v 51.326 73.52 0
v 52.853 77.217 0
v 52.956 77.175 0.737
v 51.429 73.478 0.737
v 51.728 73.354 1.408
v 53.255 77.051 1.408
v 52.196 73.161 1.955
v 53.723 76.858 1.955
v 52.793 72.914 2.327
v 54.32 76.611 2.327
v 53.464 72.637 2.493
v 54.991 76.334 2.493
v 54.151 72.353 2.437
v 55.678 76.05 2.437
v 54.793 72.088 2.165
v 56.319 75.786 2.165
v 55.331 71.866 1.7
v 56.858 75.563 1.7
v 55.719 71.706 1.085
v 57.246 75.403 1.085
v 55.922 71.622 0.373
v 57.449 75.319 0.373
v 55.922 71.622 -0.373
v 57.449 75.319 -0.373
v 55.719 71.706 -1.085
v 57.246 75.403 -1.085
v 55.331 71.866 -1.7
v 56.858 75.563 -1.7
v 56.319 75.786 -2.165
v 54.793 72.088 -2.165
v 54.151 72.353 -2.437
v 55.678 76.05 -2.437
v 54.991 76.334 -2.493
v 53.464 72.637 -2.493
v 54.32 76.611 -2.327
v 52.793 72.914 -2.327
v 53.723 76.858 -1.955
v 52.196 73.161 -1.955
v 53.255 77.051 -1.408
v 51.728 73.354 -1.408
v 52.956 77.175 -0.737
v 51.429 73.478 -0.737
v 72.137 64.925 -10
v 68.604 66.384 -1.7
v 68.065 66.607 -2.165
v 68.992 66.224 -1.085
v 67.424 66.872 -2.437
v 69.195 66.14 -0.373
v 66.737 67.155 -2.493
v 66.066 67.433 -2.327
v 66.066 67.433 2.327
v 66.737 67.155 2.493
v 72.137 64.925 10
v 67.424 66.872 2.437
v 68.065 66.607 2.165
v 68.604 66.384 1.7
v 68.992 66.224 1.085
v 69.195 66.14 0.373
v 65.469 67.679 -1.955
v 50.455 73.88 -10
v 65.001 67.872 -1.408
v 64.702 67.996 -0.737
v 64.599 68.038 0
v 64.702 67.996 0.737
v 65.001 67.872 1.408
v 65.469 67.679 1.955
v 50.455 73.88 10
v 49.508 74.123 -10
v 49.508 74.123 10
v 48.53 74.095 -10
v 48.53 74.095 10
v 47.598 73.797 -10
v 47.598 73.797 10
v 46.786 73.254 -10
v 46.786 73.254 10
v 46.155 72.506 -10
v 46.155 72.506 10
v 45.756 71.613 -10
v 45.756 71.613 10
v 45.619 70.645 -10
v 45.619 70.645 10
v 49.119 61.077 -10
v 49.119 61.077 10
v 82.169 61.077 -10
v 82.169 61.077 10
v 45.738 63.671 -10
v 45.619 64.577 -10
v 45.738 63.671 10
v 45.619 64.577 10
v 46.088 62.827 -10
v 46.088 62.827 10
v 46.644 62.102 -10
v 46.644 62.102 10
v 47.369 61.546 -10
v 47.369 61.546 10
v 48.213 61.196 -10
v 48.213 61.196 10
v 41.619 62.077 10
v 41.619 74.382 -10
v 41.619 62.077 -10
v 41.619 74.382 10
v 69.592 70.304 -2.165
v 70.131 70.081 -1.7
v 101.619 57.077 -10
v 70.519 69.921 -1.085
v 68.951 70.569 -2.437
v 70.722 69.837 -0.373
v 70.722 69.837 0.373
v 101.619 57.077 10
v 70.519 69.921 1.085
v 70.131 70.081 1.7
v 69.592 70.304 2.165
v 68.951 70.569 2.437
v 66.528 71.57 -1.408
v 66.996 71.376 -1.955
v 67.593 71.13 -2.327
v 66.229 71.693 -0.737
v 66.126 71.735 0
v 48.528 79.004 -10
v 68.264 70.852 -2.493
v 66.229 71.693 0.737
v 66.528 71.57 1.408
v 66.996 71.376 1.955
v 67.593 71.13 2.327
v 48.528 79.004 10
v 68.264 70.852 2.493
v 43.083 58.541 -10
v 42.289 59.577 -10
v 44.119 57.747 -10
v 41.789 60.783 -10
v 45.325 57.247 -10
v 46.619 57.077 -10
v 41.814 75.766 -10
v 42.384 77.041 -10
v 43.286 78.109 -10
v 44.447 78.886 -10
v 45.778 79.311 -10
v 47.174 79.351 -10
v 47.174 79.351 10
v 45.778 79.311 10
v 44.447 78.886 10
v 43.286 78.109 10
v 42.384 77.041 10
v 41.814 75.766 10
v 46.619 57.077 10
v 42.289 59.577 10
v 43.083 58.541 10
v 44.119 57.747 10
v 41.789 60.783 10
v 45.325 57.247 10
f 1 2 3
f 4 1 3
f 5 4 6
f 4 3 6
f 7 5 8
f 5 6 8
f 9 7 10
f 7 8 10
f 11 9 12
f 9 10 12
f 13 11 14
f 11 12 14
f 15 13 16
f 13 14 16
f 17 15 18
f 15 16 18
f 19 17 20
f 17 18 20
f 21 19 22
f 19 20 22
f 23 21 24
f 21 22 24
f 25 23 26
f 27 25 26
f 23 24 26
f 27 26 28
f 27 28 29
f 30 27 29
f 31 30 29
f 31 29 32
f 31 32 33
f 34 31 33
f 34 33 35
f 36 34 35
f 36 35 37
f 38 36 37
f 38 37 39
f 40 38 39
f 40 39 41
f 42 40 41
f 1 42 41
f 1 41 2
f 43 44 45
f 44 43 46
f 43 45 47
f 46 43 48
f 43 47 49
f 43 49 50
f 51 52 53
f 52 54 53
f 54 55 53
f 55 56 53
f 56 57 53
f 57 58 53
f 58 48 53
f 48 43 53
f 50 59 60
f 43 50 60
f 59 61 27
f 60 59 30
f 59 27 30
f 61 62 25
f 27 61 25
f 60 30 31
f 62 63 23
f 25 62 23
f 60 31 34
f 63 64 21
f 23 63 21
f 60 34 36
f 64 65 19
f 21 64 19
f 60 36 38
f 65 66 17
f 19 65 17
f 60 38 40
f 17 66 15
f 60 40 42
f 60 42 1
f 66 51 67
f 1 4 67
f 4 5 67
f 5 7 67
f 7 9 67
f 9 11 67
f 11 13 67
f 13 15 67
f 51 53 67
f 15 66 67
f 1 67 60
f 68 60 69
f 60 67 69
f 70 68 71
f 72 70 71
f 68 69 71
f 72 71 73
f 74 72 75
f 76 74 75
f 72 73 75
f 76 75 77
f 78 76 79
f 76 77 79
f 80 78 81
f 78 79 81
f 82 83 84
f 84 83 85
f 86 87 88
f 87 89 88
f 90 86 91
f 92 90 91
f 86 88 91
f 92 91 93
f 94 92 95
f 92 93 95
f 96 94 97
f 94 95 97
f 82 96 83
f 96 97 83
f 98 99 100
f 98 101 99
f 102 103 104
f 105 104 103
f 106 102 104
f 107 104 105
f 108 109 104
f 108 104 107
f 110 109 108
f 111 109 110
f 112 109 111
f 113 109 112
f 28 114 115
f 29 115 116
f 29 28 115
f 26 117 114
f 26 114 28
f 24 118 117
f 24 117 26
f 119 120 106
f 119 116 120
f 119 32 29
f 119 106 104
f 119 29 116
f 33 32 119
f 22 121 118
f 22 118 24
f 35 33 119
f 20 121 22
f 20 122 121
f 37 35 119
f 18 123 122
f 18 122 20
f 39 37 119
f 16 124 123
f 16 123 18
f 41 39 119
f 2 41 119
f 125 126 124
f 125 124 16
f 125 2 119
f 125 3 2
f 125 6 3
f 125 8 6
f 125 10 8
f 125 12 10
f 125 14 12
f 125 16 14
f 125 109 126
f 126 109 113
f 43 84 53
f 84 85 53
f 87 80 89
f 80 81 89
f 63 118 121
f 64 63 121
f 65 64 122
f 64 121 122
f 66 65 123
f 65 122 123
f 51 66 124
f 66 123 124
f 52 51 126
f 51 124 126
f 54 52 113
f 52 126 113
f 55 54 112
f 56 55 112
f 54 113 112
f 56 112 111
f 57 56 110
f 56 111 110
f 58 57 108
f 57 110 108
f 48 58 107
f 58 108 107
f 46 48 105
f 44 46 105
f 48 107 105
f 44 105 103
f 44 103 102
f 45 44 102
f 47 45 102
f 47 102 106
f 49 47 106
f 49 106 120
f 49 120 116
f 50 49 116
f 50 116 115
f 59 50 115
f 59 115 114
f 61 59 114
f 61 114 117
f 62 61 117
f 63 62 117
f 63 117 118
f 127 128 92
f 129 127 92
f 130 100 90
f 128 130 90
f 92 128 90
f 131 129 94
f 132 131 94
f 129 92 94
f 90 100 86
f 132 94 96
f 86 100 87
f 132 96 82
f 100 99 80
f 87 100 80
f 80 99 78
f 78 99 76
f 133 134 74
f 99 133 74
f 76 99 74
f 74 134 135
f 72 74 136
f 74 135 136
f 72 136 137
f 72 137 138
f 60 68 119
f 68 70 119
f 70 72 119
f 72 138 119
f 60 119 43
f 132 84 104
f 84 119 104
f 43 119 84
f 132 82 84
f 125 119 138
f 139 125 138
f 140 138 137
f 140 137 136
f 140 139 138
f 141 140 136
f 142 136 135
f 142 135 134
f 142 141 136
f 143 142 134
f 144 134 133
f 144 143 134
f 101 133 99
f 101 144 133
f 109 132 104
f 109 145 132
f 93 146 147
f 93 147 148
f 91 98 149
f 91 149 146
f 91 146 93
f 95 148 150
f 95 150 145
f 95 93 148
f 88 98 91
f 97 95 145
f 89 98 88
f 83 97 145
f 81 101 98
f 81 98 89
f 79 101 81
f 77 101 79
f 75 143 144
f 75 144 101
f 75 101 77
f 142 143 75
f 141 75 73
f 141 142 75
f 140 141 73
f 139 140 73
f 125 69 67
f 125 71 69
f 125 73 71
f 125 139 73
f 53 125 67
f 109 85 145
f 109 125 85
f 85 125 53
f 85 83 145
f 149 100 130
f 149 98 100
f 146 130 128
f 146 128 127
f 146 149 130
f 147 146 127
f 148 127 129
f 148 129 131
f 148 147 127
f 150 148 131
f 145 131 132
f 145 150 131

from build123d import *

# Parameters (mm, degrees)
BOSS_EXTRU_1_DEPTH      = 10
ESQUISSE2_R             = 2.5
ENL_V_MAT_EXTRU_1_DEPTH = 8


with BuildPart() as part:
    # Esquisse1 → Boss.-Extru.1 (new, symmetric)
    with BuildSketch(Plane.XY):
        with BuildLine():
            Line((46.618888989, 57.076719782), (101.618888989, 57.076719782))
            Line((101.618888989, 57.076719782), (48.527534404, 79.003668292))
            ThreePointArc((48.527534404, 79.003668292), (43.838891424, 78.538210075), (41.618888989, 74.382296994))
            Line((41.618888989, 74.382296994), (41.618888989, 62.076719782))
            ThreePointArc((41.618888989, 62.076719782), (43.083355083, 58.541185876), (46.618888989, 57.076719782))
        make_face()
        with BuildLine():
            Line((72.136693702, 64.925268301), (50.45494078, 73.879921722))
            ThreePointArc((50.45494078, 73.879921722), (47.172890694, 73.554100969), (45.618888989, 70.644961813))
            Line((45.618888989, 70.644961813), (45.618888989, 64.576719782))
            ThreePointArc((45.618888989, 64.576719782), (46.644015255, 62.101846047), (49.118888989, 61.076719782))
            Line((49.118888989, 61.076719782), (71.373235536, 61.076719782))
            Line((71.373235536, 61.076719782), (82.169018373, 61.076719782))
            Line((82.169018373, 61.076719782), (72.136693702, 64.925268301))
        make_face(mode=Mode.SUBTRACT)
    extrude(amount=BOSS_EXTRU_1_DEPTH, both=True)

    # Esquisse2 → Enlèv. mat.-Extru.1 (cut)
    with BuildSketch(Plane(origin=(34.945552376, 84.613082912, 0), x_dir=(0.9242742597143897, -0.38172908302802533, 0), z_dir=(0.3817290830280253, 0.9242742597143896, 0))):
        with Locations(Location((21.875034686, 0, 0), (0, 0, 180))):
            Circle(ESQUISSE2_R)
        with Locations(Location((36.235316287, 0, 0), (0, 0, 180))):
            Circle(ESQUISSE2_R)
    extrude(amount=-ENL_V_MAT_EXTRU_1_DEPTH, mode=Mode.SUBTRACT)


solid = part.part
